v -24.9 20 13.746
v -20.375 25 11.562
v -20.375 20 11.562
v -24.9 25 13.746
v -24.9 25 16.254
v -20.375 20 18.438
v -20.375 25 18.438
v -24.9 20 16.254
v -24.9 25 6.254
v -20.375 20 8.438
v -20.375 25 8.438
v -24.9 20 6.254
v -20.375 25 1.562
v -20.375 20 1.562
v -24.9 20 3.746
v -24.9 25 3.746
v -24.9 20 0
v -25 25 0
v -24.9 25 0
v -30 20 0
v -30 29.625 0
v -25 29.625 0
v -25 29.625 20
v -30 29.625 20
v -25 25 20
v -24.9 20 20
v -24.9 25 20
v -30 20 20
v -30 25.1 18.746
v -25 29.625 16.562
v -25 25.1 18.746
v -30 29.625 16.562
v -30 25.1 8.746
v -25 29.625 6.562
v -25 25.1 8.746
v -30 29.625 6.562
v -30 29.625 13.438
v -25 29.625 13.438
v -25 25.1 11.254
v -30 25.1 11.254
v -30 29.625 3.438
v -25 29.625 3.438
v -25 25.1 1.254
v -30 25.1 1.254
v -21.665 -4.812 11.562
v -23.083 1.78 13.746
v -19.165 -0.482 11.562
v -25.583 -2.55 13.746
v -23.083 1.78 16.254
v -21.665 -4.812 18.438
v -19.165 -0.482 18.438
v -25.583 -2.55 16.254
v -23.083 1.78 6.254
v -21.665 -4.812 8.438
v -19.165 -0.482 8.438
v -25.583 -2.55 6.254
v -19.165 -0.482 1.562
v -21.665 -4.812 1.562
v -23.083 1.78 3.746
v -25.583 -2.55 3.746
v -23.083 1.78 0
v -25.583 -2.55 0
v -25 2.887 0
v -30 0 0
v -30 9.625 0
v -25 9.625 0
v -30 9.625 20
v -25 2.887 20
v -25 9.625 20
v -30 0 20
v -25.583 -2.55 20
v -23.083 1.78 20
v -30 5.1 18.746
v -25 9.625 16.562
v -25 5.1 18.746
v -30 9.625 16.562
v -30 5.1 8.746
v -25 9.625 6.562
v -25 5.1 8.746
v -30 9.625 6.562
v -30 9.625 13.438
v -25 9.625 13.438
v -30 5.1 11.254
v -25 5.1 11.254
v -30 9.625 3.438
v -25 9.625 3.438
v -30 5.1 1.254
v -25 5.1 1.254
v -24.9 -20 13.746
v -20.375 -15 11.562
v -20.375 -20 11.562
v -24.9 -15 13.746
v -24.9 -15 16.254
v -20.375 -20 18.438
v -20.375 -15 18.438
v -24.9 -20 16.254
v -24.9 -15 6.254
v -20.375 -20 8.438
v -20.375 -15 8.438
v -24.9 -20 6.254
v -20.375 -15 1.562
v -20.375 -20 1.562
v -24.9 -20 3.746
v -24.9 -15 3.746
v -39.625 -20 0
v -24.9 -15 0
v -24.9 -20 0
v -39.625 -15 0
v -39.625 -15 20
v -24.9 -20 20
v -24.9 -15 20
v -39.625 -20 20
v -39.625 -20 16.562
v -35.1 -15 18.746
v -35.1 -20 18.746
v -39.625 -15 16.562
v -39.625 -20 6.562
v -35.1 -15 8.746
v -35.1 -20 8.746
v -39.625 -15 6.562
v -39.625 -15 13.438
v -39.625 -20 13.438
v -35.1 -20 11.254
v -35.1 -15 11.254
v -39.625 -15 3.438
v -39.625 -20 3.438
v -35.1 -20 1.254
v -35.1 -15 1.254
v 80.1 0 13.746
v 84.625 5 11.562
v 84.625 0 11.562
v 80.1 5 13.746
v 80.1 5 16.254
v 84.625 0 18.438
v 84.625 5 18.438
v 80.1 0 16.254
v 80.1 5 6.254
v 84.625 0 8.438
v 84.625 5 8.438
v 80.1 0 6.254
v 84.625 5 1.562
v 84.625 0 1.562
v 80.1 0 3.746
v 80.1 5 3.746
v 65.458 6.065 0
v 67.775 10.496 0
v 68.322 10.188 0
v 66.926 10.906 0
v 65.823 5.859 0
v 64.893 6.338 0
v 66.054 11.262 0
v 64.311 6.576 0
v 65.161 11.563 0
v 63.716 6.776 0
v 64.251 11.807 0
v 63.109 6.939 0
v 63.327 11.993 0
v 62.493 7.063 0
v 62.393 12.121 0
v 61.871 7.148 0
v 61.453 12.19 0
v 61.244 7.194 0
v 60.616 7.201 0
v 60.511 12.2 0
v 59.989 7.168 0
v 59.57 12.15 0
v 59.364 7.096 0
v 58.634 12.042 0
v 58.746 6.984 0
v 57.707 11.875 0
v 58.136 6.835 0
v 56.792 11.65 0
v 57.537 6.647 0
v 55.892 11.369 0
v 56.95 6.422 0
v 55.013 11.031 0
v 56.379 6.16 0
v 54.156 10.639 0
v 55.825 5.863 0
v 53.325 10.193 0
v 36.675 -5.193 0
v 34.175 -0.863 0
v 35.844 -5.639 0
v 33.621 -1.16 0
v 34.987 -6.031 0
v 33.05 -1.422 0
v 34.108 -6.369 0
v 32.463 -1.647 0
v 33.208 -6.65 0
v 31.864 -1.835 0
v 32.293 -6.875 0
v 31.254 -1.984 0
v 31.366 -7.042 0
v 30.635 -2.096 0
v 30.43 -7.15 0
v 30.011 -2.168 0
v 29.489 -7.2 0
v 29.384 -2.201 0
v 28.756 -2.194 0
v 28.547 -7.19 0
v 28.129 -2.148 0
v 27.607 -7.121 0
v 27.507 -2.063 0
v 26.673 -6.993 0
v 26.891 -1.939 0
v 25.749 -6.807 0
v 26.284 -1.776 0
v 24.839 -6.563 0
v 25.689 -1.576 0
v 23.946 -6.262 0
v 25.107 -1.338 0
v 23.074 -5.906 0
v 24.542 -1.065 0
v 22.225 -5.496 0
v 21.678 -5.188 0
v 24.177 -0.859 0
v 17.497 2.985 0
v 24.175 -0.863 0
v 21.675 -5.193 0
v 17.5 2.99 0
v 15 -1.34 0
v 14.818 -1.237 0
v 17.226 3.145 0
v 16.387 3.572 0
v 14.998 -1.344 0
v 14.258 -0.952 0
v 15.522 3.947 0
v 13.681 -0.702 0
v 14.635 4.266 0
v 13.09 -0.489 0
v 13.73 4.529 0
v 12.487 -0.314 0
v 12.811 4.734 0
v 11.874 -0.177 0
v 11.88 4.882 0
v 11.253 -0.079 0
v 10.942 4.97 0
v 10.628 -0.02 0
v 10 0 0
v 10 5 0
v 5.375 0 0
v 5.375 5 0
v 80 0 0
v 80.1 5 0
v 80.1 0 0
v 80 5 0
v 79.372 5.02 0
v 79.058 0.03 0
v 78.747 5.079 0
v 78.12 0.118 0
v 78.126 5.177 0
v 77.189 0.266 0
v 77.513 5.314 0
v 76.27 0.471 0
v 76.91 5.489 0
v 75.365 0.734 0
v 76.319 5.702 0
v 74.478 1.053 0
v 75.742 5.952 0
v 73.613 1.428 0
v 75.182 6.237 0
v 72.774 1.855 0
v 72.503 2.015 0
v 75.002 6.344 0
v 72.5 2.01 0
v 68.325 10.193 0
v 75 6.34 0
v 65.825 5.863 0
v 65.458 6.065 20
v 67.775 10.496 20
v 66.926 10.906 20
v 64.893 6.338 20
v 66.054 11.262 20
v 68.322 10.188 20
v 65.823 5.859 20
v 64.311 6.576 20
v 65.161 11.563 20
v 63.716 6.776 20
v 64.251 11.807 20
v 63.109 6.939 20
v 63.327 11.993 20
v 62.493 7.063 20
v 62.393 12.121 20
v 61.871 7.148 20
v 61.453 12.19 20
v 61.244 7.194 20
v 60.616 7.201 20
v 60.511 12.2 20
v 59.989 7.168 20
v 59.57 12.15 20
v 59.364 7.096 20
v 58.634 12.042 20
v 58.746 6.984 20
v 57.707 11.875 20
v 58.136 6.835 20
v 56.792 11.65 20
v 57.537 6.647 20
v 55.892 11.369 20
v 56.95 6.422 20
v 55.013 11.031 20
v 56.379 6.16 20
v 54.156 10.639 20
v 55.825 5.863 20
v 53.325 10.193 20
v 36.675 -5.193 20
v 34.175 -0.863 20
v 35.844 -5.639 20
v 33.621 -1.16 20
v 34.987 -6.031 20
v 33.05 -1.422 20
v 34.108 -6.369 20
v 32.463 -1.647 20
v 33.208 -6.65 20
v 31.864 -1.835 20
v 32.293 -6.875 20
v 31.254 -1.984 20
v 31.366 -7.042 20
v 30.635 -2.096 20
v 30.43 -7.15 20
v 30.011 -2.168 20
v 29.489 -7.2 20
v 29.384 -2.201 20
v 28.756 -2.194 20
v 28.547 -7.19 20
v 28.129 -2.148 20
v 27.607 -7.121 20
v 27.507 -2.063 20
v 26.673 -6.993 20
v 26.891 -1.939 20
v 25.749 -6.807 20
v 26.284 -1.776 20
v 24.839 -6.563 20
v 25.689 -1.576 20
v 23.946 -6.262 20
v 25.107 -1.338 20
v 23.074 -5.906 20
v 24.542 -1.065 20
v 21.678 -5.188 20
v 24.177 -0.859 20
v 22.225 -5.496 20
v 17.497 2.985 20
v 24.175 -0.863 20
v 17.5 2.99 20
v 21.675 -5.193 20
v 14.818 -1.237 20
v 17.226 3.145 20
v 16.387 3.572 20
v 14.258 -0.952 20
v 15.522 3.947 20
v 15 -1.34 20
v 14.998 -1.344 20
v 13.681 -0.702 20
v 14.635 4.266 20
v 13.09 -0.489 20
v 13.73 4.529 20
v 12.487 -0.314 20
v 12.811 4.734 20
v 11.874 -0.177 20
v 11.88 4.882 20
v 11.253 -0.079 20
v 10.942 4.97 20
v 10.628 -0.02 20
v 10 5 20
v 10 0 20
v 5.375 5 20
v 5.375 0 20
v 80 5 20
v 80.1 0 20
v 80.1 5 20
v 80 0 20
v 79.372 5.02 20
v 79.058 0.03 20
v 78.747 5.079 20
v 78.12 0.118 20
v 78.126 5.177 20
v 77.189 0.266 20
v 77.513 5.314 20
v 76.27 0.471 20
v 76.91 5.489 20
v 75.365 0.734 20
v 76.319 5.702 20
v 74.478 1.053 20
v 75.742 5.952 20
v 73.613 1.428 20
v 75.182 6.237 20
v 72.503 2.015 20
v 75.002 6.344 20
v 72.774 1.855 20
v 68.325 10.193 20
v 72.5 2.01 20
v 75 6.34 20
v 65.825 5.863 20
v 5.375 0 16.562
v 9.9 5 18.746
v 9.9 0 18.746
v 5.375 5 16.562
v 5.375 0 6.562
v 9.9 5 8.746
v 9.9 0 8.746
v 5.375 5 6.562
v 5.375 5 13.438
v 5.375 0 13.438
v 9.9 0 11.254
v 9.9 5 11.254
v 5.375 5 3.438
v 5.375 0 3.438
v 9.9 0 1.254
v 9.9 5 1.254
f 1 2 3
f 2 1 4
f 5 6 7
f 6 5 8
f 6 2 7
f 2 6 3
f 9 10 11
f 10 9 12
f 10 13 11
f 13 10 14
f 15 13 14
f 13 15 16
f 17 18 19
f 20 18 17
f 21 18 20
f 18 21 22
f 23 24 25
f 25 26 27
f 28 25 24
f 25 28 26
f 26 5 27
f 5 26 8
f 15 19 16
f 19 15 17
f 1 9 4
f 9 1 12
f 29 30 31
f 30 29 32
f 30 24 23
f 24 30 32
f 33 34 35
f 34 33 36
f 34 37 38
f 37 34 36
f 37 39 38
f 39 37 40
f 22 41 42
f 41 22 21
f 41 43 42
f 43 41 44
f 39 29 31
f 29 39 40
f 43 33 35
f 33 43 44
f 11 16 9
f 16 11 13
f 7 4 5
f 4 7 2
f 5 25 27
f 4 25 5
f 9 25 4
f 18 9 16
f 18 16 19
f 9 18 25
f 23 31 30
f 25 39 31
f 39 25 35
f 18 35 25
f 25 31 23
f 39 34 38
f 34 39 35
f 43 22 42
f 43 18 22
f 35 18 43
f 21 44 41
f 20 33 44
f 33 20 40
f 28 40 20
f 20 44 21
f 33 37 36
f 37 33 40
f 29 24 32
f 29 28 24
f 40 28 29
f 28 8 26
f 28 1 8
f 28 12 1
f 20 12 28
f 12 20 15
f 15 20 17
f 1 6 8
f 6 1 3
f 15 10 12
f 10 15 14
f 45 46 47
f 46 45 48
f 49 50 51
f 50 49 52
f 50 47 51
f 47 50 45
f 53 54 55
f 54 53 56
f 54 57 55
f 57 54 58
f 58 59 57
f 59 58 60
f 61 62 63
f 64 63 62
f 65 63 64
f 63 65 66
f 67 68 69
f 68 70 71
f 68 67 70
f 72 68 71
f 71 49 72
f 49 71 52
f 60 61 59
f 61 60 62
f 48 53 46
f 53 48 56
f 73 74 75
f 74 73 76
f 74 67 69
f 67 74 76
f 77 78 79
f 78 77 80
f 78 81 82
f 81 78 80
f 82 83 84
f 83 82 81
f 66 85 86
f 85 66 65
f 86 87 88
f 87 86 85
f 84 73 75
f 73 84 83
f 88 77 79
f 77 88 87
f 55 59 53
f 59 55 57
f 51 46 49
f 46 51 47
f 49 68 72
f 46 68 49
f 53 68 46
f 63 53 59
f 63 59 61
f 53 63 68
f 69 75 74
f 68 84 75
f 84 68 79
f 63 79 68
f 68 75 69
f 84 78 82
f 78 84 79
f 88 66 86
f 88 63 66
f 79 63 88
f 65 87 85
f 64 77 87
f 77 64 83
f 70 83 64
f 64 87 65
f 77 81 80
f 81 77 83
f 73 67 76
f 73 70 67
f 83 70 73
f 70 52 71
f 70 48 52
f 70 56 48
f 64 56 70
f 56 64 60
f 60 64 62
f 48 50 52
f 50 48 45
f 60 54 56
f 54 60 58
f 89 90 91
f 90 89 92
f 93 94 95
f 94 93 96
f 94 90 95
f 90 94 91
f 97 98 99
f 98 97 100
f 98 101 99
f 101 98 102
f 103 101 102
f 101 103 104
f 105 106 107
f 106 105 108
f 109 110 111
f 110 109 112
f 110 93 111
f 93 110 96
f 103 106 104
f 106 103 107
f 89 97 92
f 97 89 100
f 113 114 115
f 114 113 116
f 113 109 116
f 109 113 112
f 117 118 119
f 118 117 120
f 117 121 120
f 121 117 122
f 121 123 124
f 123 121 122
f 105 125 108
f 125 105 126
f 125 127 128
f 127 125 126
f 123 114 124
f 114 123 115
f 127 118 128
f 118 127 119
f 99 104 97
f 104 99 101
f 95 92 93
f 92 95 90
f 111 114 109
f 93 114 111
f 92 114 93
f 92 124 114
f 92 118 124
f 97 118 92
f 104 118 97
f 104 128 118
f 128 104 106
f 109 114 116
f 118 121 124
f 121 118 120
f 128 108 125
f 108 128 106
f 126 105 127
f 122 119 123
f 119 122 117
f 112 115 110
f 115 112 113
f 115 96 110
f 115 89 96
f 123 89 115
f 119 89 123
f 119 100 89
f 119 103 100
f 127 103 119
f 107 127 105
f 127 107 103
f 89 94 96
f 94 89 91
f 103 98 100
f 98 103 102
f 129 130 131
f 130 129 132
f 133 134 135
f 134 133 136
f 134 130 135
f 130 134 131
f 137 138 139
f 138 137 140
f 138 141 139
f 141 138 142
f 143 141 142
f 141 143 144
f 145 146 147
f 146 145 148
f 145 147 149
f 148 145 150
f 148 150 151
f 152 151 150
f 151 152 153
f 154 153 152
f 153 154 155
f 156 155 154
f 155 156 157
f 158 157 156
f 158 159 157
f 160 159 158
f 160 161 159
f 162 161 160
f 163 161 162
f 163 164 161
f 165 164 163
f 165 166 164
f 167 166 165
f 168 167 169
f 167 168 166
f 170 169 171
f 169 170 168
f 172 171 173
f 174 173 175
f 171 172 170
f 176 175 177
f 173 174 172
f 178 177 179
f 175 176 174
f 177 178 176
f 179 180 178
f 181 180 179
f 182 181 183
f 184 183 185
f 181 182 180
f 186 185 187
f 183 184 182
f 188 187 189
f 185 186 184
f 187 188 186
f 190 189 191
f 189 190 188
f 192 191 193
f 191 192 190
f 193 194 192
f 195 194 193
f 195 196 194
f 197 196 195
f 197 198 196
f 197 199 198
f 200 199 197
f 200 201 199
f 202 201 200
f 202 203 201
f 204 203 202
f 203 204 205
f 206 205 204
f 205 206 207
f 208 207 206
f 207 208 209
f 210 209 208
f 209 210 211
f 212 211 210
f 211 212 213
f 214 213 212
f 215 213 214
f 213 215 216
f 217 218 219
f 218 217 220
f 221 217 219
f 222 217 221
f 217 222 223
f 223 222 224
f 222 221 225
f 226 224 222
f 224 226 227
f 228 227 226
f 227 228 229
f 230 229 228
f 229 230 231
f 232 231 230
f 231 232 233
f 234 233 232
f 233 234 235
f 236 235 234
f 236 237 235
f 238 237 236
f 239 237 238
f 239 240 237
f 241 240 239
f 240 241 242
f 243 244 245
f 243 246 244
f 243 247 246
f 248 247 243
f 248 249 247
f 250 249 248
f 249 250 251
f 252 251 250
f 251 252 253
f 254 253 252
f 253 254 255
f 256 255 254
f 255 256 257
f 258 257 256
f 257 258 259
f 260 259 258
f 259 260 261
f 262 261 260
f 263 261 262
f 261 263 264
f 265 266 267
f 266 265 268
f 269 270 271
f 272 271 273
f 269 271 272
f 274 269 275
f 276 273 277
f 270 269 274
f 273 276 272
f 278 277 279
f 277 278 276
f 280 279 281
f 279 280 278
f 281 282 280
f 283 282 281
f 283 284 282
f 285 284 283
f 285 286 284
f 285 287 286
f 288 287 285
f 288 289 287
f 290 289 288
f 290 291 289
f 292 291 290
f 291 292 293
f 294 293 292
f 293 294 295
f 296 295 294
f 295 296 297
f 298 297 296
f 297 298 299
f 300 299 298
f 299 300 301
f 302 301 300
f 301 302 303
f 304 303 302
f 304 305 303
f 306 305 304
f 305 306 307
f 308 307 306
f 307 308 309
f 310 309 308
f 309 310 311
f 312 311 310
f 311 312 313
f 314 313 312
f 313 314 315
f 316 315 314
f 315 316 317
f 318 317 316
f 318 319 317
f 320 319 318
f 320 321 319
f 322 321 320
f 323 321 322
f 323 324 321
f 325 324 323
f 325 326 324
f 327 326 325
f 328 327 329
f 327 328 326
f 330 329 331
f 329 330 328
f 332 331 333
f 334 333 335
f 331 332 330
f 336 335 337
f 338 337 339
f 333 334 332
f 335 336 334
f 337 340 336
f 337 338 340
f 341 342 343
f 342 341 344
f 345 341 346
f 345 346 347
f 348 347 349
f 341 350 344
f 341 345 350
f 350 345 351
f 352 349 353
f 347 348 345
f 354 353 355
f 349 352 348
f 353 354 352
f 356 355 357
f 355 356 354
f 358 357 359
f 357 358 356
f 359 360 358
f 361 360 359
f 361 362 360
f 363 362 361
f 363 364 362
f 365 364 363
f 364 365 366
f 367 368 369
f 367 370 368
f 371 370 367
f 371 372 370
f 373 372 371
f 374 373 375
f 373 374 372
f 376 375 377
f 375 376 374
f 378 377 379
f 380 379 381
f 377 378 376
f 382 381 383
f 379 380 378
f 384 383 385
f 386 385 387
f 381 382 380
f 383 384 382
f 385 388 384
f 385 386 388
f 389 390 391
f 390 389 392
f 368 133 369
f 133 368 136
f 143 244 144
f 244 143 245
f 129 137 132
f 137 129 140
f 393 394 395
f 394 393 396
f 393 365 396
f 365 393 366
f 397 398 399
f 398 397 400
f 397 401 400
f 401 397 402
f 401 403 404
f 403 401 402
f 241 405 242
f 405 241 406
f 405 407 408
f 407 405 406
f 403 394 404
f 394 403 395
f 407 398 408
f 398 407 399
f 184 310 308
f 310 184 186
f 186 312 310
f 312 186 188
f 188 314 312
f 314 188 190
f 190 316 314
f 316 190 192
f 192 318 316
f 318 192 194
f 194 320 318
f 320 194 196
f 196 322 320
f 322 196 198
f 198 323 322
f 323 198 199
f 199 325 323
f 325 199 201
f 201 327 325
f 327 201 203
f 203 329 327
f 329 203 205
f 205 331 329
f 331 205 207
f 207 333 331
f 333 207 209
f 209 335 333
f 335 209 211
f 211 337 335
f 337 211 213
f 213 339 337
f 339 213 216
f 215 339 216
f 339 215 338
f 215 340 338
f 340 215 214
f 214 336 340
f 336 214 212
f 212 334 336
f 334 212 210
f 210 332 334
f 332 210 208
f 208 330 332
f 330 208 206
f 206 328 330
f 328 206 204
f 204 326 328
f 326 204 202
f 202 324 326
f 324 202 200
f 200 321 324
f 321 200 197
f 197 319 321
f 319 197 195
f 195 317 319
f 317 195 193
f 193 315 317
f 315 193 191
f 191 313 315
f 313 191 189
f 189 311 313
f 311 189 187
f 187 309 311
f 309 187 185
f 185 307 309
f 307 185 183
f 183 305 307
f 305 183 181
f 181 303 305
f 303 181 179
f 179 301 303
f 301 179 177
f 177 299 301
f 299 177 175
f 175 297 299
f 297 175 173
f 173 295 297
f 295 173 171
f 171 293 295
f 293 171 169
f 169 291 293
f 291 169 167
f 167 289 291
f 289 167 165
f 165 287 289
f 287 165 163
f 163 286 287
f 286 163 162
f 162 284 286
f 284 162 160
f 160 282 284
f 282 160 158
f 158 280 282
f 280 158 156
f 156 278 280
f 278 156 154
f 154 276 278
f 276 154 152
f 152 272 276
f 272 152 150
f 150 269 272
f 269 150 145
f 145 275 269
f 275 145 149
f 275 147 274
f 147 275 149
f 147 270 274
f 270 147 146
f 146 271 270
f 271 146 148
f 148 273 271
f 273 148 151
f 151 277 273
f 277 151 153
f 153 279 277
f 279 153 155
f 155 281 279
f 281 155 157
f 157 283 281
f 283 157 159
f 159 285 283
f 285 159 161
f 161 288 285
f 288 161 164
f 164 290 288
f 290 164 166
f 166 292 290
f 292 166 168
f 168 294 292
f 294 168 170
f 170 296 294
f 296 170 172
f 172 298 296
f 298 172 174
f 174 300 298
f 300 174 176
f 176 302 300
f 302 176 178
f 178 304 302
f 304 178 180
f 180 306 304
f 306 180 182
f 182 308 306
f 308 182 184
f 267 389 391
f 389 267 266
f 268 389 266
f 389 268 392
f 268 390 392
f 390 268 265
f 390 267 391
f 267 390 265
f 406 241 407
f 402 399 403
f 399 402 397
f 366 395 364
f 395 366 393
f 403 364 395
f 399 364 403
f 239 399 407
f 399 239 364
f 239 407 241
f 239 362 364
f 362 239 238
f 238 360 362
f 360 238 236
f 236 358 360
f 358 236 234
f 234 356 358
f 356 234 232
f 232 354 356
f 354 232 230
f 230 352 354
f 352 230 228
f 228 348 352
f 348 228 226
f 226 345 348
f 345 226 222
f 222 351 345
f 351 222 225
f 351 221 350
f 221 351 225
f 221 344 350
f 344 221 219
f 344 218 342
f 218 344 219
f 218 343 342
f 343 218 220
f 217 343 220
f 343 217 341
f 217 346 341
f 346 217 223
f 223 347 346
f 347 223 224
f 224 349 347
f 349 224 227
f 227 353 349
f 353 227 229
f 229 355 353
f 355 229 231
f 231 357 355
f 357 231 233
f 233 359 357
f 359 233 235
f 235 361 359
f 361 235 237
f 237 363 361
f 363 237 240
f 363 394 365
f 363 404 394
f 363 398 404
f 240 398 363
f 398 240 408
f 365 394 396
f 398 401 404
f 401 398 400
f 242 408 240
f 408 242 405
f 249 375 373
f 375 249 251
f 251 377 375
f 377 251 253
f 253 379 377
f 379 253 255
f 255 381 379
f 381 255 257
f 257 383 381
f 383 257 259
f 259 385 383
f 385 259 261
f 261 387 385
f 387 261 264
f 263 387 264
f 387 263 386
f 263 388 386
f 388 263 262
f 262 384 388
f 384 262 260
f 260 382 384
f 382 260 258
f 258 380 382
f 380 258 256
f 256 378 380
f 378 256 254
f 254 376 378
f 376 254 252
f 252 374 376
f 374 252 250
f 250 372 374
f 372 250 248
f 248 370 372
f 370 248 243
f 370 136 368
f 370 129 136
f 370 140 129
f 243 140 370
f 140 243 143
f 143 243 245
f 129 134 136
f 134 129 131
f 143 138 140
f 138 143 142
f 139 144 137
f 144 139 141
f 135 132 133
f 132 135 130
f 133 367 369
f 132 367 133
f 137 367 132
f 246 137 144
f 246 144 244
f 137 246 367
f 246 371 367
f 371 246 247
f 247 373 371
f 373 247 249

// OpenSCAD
// file: ../dovetail.scad
/**
 *  Dovetail parametric generator for OpenScad
 *  Générateur de queue d'aronde pour OpenScad
 *
 *  Copyright (c) 2012 Charles Rincheval.  All rights reserved.
 *
 *  This library is free software; you can redistribute it and/or
 *  modify it under the terms of the GNU Lesser General Public
 *  License as published by the Free Software Foundation; either
 *  version 2.1 of the License, or (at your option) any later version.
 *
 *  This library is distributed in the hope that it will be useful,
 *  but WITHOUT ANY WARRANTY; without even the implied warranty of
 *  MERCHANTABILITY or FITNESS FOR A PARTICULAR PURPOSE.  See the GNU
 *  Lesser General Public License for more details.
 *
 *  You should have received a copy of the GNU Lesser General Public
 *  License along with this library; if not, write to the Free Software
 *  Foundation, Inc., 51 Franklin St, Fifth Floor, Boston, MA  02110-1301  USA
 *
 *  Last update :
 *  https://github.com/hugokernel/OpenSCAD_Dovetail
 *
 *  http://www.digitalspirit.org/
 */

/**
 *  Create one teeth
 *  @param int width        Teeth width
 *  @param int height       Teeth height
 *  @param int thickness    Teeth thickness
 */
module dovetail_teeth(width, height, thickness) {
    offset = width / 3;
    translate([- width / 2, - height / 2, 0]) {
        linear_extrude(height = thickness) {
            polygon([[0, 0], [width, 0], [width - offset, height], [offset, height]]);
        }
    }
}


/**
 *  Dovetail
 *  @param int  width           Dovetail width
 *  @param int  teeth_count     Teeth count
 *  @param int  teeth_height    Teeth height
 *  @param int  teeth_thickness Teeth thickness
 *  @param int  clear           Teeth clear
 *  @param bool male            Get male (true) or female (false)
 */
module dovetail(width, teeth_count, teeth_height, teeth_thickness, clear=0.1, male=true, debug=false) {

    /**
     * 4 sections :
     *
     * |1/2         1/2|
     * |--+ <- 3 -> +--|--+         +--
     * |   \1  1  1/   |   \       /
     * |    \_____/    |    \_____/
     */

    y = ((width - teeth_count * 2 * clear) / teeth_count) / 4;

    compensation = - 0.1;
    teeth_width = y * 3;

    // Always width / 3 (ref. dovetail_teeth())
    offset = teeth_width / 3;
    start_at = clear * 2 + teeth_width / 2 - width / 2 - clear;

    translate([0, 0, - teeth_thickness / 2]) {

        // Debug purpose only
        if (debug) {
            translate([- width / 2, 0, - width / 2]) {
                %cube(size = [width, 0.01, width]);
            }
        }

        for (i = [-1 : teeth_count * 2 - 1] ) {
            x = start_at + y / 2 + (teeth_width - offset + clear) * i;
            if (i % 2) {
                x = x + 0.1;
                translate([x + compensation, - clear, 0]) {
                    rotate([0, 0, 180]) {
                        if (male == true) {
                            dovetail_teeth(teeth_width - clear, teeth_height - clear, teeth_thickness);
                        }
                    }
                }
            } else {
                translate([x, clear, 0]) {
                    if (male == false) {
                        dovetail_teeth(teeth_width - clear, teeth_height - clear, teeth_thickness);
                    }
                }
            }
        }
    }
}

/**
 *  Cut piece
 *  @param vector position  Cut position ([x, y, z])
 *  @param vector dimension Dimension of bounding box ([w, l, h])
 *  @param vector teeths    Teeths parameters ([count, height, clearance])
 *  @param bool   male      Get male (true) or female (false)
 */
module cutter(position, dimension, teeths, male=true, debug=false) {
    translate(position) {
        dovetail(dimension[0], teeths[0], teeths[1], dimension[2], teeths[2], male, debug);

        if (male) {
            translate([- dimension[0] / 2, - (teeths[1] / 2 - 0.1) - dimension[1], - dimension[2] / 2]) {
                cube(size = dimension);
            }
        } else {
            translate([- dimension[0] / 2, teeths[1] / 2 - 0.1, - dimension[2] / 2]) {
                cube(size = dimension);
            }
        }
    }
}
// main file
include <../dovetail.scad>;

// Height
height = 20;

// Width
w = 5;

// In-radius
in = 10;

// Angle
angle = 30;

// Total length
L = 90;

// Number of teeth
teeth_count = 2;

// Height of each tooth
teeth_height = w;

// Wiggle room
teeth_clearance = 0.25;



s = sin(angle);
c = cos(angle);

x = (L-4*w-3*(w+2*in)*s)/c;
y = (w+2*in)*(1-c)/s;

b = (x + y)/2;

a = (x-b)/2;

$fn = 100;

module segment(angle) {
    intersection() {
        difference() {
            circle(r=w+in);
            circle(r=in);
        }
        translate([0,-w-in]) square([w+in,2*(w+in)]);
        rotate([0,0,90-angle]) translate([-w-in,0]) square([2*(w+in),w+in]);
    }
}


module edge() {

    p0 = [2*w,w];

    p1 = p0 + [(w+in)*s, -(w+in)*(1-c)];

    p2 = p1 + [a*c, -a*s];

    p3 = p2 + [in*s,in*c];

    p4 = p2 + [in*2*s,0];

    p5 = p4 + [b*c,b*s];

    p6 = p5 + [(w+in)*s,-(w+in)*c];

    p7 = p5 + [2*(w+in)*s,0];

    p8 = p7 + [a*c, -a*s];

    p9 = p8 + [in*s, -in*(1-c)];

    linear_extrude(height) {
        
        translate(p0+[0,-w-in,0]) segment(angle);

        translate(p3) rotate([0,0,180+angle]) segment(2*angle);

        translate(p1) rotate(-angle) translate([0,-w]) square([a,w]);

        translate(p4) rotate(angle) translate([0,-w]) square([b,w]);

        translate(p6) rotate(angle) segment(2*angle);

        translate(p7) rotate(-angle) translate([0,-w]) square([a,w]);

        translate(p0+[L-4*w,in]) rotate(180) segment(angle);
        
        color("white") translate([0,0]) square([2*w,w]);

        color("blue") translate([L-2*w,0]) square([2*w,w]);
    }
}

module convex_90() {
    linear_extrude(height) {
        square(w);
        translate([w,0,0]) square(w);
        translate([0,w,0]) square(w);
    }
}

module convex_120() {
    linear_extrude(height) {
        square([2*w,w]);
        translate([0,0,0]) rotate(30) square([w,2*w]);
    }
}

module straight() {
    linear_extrude(height) {
        translate([-2*w,0,0]) square([4*w,w]);
    }
}

function monotile_points() = 
    let(
    a=L,
    b=L,
    c = cos(60),
    s = sin(60),

    moves = [
        [0, 0, -60],
        [c*b, s*b, 60],
        [b,0, -90],
        [0,a, 60],
        [s*a, c*a, 90],
        [c*b, -s*b, 60],
        [-c*b, -s*b, -90],
        [s*a, -c*a, 60],
        [0, -a, 0],
        [0, -a, 60],
        [-s*a, -c*a, 90],
        [-c*b, s*b, -60],
        [-b, 0, 90],
        [0, a, -60],
        [-s*a, c*a, 90]
    ]
    )
        
    [ 
        for (
            i=0, p=moves[0]; 
            i < len(moves)-1; 
            i = i+1, p = p + moves[i]
        )
        p
    ]
;

module cut_edge() {
    intersection() {
        edge();
        
        translate([L-w-w/2,0,height/2])
        rotate([0,90,90]) 
        cutter(
            position=[0, 0, 0], 
            dimension=[height,L,100],
            teeths=[teeth_count, teeth_height, teeth_clearance],
            male=false
        );
        
        translate([w+w/2,0,height/2])
        rotate([0,90,90])
        cutter(
            position=[0, 0, 0],
            dimension=[height,L,100],
            teeths=[teeth_count, teeth_height, teeth_clearance],
            male=true
        );
    }
}

module cut_convex_90() {
    intersection() {
        convex_90();

            
        translate([w+w/2,0,height/2])
        rotate([0,90,90]) 
        cutter(
            position=[0, 0, 0], 
            dimension=[height,4*w,100],
            teeths=[teeth_count, teeth_height, teeth_clearance],
            male=false
        );
        
        
        translate([0,w+w/2,height/2])
        rotate([0,90,0])
        cutter(
            position=[0, 0, 0],
            dimension=[height,L,100],
            teeths=[teeth_count, teeth_height, teeth_clearance],
            male=true
        );
        
    }
}

module cut_convex_120() {
    intersection() {
        convex_120();

            
        translate([w+w/2,0,height/2])
        rotate([0,90,90]) 
        cutter(
            position=[0, 0, 0], 
            dimension=[height,4*w,100],
            teeths=[teeth_count, teeth_height, teeth_clearance],
            male=false
        );
        
        
        rotate(30)
        translate([0,w+w/2,height/2])
        rotate([0,90,0])
        cutter(
            position=[0, 0, 0],
            dimension=[height,L,100],
            teeths=[teeth_count, teeth_height, teeth_clearance],
            male=true
        );
        
    }
}

module cut_straight() {
    intersection() {
        straight();

            
        translate([w+w/2,0,height/2])
        rotate([0,90,90]) 
        cutter(
            position=[0, 0, 0], 
            dimension=[height,4*w,100],
            teeths=[teeth_count, teeth_height, teeth_clearance],
            male=false
        );
        
        
        #translate([-w-w/2,0,height/2])
        rotate([0,90,90])
        cutter(
            position=[0, 0, 0],
            dimension=[height,L,100],
            teeths=[teeth_count, teeth_height, teeth_clearance],
            male=true
        );
        
    }
}

translate([-30,20,0]) cut_convex_90();
translate([-30,0,0]) rotate(-30) cut_convex_120();
translate([-30,-20,0]) cut_straight();
cut_edge();


//rotate([0,-90,0]) cut_convex_90();
//rotate(-30) cut_convex_120();
// rotate([90,0,0]) cut_straight();
